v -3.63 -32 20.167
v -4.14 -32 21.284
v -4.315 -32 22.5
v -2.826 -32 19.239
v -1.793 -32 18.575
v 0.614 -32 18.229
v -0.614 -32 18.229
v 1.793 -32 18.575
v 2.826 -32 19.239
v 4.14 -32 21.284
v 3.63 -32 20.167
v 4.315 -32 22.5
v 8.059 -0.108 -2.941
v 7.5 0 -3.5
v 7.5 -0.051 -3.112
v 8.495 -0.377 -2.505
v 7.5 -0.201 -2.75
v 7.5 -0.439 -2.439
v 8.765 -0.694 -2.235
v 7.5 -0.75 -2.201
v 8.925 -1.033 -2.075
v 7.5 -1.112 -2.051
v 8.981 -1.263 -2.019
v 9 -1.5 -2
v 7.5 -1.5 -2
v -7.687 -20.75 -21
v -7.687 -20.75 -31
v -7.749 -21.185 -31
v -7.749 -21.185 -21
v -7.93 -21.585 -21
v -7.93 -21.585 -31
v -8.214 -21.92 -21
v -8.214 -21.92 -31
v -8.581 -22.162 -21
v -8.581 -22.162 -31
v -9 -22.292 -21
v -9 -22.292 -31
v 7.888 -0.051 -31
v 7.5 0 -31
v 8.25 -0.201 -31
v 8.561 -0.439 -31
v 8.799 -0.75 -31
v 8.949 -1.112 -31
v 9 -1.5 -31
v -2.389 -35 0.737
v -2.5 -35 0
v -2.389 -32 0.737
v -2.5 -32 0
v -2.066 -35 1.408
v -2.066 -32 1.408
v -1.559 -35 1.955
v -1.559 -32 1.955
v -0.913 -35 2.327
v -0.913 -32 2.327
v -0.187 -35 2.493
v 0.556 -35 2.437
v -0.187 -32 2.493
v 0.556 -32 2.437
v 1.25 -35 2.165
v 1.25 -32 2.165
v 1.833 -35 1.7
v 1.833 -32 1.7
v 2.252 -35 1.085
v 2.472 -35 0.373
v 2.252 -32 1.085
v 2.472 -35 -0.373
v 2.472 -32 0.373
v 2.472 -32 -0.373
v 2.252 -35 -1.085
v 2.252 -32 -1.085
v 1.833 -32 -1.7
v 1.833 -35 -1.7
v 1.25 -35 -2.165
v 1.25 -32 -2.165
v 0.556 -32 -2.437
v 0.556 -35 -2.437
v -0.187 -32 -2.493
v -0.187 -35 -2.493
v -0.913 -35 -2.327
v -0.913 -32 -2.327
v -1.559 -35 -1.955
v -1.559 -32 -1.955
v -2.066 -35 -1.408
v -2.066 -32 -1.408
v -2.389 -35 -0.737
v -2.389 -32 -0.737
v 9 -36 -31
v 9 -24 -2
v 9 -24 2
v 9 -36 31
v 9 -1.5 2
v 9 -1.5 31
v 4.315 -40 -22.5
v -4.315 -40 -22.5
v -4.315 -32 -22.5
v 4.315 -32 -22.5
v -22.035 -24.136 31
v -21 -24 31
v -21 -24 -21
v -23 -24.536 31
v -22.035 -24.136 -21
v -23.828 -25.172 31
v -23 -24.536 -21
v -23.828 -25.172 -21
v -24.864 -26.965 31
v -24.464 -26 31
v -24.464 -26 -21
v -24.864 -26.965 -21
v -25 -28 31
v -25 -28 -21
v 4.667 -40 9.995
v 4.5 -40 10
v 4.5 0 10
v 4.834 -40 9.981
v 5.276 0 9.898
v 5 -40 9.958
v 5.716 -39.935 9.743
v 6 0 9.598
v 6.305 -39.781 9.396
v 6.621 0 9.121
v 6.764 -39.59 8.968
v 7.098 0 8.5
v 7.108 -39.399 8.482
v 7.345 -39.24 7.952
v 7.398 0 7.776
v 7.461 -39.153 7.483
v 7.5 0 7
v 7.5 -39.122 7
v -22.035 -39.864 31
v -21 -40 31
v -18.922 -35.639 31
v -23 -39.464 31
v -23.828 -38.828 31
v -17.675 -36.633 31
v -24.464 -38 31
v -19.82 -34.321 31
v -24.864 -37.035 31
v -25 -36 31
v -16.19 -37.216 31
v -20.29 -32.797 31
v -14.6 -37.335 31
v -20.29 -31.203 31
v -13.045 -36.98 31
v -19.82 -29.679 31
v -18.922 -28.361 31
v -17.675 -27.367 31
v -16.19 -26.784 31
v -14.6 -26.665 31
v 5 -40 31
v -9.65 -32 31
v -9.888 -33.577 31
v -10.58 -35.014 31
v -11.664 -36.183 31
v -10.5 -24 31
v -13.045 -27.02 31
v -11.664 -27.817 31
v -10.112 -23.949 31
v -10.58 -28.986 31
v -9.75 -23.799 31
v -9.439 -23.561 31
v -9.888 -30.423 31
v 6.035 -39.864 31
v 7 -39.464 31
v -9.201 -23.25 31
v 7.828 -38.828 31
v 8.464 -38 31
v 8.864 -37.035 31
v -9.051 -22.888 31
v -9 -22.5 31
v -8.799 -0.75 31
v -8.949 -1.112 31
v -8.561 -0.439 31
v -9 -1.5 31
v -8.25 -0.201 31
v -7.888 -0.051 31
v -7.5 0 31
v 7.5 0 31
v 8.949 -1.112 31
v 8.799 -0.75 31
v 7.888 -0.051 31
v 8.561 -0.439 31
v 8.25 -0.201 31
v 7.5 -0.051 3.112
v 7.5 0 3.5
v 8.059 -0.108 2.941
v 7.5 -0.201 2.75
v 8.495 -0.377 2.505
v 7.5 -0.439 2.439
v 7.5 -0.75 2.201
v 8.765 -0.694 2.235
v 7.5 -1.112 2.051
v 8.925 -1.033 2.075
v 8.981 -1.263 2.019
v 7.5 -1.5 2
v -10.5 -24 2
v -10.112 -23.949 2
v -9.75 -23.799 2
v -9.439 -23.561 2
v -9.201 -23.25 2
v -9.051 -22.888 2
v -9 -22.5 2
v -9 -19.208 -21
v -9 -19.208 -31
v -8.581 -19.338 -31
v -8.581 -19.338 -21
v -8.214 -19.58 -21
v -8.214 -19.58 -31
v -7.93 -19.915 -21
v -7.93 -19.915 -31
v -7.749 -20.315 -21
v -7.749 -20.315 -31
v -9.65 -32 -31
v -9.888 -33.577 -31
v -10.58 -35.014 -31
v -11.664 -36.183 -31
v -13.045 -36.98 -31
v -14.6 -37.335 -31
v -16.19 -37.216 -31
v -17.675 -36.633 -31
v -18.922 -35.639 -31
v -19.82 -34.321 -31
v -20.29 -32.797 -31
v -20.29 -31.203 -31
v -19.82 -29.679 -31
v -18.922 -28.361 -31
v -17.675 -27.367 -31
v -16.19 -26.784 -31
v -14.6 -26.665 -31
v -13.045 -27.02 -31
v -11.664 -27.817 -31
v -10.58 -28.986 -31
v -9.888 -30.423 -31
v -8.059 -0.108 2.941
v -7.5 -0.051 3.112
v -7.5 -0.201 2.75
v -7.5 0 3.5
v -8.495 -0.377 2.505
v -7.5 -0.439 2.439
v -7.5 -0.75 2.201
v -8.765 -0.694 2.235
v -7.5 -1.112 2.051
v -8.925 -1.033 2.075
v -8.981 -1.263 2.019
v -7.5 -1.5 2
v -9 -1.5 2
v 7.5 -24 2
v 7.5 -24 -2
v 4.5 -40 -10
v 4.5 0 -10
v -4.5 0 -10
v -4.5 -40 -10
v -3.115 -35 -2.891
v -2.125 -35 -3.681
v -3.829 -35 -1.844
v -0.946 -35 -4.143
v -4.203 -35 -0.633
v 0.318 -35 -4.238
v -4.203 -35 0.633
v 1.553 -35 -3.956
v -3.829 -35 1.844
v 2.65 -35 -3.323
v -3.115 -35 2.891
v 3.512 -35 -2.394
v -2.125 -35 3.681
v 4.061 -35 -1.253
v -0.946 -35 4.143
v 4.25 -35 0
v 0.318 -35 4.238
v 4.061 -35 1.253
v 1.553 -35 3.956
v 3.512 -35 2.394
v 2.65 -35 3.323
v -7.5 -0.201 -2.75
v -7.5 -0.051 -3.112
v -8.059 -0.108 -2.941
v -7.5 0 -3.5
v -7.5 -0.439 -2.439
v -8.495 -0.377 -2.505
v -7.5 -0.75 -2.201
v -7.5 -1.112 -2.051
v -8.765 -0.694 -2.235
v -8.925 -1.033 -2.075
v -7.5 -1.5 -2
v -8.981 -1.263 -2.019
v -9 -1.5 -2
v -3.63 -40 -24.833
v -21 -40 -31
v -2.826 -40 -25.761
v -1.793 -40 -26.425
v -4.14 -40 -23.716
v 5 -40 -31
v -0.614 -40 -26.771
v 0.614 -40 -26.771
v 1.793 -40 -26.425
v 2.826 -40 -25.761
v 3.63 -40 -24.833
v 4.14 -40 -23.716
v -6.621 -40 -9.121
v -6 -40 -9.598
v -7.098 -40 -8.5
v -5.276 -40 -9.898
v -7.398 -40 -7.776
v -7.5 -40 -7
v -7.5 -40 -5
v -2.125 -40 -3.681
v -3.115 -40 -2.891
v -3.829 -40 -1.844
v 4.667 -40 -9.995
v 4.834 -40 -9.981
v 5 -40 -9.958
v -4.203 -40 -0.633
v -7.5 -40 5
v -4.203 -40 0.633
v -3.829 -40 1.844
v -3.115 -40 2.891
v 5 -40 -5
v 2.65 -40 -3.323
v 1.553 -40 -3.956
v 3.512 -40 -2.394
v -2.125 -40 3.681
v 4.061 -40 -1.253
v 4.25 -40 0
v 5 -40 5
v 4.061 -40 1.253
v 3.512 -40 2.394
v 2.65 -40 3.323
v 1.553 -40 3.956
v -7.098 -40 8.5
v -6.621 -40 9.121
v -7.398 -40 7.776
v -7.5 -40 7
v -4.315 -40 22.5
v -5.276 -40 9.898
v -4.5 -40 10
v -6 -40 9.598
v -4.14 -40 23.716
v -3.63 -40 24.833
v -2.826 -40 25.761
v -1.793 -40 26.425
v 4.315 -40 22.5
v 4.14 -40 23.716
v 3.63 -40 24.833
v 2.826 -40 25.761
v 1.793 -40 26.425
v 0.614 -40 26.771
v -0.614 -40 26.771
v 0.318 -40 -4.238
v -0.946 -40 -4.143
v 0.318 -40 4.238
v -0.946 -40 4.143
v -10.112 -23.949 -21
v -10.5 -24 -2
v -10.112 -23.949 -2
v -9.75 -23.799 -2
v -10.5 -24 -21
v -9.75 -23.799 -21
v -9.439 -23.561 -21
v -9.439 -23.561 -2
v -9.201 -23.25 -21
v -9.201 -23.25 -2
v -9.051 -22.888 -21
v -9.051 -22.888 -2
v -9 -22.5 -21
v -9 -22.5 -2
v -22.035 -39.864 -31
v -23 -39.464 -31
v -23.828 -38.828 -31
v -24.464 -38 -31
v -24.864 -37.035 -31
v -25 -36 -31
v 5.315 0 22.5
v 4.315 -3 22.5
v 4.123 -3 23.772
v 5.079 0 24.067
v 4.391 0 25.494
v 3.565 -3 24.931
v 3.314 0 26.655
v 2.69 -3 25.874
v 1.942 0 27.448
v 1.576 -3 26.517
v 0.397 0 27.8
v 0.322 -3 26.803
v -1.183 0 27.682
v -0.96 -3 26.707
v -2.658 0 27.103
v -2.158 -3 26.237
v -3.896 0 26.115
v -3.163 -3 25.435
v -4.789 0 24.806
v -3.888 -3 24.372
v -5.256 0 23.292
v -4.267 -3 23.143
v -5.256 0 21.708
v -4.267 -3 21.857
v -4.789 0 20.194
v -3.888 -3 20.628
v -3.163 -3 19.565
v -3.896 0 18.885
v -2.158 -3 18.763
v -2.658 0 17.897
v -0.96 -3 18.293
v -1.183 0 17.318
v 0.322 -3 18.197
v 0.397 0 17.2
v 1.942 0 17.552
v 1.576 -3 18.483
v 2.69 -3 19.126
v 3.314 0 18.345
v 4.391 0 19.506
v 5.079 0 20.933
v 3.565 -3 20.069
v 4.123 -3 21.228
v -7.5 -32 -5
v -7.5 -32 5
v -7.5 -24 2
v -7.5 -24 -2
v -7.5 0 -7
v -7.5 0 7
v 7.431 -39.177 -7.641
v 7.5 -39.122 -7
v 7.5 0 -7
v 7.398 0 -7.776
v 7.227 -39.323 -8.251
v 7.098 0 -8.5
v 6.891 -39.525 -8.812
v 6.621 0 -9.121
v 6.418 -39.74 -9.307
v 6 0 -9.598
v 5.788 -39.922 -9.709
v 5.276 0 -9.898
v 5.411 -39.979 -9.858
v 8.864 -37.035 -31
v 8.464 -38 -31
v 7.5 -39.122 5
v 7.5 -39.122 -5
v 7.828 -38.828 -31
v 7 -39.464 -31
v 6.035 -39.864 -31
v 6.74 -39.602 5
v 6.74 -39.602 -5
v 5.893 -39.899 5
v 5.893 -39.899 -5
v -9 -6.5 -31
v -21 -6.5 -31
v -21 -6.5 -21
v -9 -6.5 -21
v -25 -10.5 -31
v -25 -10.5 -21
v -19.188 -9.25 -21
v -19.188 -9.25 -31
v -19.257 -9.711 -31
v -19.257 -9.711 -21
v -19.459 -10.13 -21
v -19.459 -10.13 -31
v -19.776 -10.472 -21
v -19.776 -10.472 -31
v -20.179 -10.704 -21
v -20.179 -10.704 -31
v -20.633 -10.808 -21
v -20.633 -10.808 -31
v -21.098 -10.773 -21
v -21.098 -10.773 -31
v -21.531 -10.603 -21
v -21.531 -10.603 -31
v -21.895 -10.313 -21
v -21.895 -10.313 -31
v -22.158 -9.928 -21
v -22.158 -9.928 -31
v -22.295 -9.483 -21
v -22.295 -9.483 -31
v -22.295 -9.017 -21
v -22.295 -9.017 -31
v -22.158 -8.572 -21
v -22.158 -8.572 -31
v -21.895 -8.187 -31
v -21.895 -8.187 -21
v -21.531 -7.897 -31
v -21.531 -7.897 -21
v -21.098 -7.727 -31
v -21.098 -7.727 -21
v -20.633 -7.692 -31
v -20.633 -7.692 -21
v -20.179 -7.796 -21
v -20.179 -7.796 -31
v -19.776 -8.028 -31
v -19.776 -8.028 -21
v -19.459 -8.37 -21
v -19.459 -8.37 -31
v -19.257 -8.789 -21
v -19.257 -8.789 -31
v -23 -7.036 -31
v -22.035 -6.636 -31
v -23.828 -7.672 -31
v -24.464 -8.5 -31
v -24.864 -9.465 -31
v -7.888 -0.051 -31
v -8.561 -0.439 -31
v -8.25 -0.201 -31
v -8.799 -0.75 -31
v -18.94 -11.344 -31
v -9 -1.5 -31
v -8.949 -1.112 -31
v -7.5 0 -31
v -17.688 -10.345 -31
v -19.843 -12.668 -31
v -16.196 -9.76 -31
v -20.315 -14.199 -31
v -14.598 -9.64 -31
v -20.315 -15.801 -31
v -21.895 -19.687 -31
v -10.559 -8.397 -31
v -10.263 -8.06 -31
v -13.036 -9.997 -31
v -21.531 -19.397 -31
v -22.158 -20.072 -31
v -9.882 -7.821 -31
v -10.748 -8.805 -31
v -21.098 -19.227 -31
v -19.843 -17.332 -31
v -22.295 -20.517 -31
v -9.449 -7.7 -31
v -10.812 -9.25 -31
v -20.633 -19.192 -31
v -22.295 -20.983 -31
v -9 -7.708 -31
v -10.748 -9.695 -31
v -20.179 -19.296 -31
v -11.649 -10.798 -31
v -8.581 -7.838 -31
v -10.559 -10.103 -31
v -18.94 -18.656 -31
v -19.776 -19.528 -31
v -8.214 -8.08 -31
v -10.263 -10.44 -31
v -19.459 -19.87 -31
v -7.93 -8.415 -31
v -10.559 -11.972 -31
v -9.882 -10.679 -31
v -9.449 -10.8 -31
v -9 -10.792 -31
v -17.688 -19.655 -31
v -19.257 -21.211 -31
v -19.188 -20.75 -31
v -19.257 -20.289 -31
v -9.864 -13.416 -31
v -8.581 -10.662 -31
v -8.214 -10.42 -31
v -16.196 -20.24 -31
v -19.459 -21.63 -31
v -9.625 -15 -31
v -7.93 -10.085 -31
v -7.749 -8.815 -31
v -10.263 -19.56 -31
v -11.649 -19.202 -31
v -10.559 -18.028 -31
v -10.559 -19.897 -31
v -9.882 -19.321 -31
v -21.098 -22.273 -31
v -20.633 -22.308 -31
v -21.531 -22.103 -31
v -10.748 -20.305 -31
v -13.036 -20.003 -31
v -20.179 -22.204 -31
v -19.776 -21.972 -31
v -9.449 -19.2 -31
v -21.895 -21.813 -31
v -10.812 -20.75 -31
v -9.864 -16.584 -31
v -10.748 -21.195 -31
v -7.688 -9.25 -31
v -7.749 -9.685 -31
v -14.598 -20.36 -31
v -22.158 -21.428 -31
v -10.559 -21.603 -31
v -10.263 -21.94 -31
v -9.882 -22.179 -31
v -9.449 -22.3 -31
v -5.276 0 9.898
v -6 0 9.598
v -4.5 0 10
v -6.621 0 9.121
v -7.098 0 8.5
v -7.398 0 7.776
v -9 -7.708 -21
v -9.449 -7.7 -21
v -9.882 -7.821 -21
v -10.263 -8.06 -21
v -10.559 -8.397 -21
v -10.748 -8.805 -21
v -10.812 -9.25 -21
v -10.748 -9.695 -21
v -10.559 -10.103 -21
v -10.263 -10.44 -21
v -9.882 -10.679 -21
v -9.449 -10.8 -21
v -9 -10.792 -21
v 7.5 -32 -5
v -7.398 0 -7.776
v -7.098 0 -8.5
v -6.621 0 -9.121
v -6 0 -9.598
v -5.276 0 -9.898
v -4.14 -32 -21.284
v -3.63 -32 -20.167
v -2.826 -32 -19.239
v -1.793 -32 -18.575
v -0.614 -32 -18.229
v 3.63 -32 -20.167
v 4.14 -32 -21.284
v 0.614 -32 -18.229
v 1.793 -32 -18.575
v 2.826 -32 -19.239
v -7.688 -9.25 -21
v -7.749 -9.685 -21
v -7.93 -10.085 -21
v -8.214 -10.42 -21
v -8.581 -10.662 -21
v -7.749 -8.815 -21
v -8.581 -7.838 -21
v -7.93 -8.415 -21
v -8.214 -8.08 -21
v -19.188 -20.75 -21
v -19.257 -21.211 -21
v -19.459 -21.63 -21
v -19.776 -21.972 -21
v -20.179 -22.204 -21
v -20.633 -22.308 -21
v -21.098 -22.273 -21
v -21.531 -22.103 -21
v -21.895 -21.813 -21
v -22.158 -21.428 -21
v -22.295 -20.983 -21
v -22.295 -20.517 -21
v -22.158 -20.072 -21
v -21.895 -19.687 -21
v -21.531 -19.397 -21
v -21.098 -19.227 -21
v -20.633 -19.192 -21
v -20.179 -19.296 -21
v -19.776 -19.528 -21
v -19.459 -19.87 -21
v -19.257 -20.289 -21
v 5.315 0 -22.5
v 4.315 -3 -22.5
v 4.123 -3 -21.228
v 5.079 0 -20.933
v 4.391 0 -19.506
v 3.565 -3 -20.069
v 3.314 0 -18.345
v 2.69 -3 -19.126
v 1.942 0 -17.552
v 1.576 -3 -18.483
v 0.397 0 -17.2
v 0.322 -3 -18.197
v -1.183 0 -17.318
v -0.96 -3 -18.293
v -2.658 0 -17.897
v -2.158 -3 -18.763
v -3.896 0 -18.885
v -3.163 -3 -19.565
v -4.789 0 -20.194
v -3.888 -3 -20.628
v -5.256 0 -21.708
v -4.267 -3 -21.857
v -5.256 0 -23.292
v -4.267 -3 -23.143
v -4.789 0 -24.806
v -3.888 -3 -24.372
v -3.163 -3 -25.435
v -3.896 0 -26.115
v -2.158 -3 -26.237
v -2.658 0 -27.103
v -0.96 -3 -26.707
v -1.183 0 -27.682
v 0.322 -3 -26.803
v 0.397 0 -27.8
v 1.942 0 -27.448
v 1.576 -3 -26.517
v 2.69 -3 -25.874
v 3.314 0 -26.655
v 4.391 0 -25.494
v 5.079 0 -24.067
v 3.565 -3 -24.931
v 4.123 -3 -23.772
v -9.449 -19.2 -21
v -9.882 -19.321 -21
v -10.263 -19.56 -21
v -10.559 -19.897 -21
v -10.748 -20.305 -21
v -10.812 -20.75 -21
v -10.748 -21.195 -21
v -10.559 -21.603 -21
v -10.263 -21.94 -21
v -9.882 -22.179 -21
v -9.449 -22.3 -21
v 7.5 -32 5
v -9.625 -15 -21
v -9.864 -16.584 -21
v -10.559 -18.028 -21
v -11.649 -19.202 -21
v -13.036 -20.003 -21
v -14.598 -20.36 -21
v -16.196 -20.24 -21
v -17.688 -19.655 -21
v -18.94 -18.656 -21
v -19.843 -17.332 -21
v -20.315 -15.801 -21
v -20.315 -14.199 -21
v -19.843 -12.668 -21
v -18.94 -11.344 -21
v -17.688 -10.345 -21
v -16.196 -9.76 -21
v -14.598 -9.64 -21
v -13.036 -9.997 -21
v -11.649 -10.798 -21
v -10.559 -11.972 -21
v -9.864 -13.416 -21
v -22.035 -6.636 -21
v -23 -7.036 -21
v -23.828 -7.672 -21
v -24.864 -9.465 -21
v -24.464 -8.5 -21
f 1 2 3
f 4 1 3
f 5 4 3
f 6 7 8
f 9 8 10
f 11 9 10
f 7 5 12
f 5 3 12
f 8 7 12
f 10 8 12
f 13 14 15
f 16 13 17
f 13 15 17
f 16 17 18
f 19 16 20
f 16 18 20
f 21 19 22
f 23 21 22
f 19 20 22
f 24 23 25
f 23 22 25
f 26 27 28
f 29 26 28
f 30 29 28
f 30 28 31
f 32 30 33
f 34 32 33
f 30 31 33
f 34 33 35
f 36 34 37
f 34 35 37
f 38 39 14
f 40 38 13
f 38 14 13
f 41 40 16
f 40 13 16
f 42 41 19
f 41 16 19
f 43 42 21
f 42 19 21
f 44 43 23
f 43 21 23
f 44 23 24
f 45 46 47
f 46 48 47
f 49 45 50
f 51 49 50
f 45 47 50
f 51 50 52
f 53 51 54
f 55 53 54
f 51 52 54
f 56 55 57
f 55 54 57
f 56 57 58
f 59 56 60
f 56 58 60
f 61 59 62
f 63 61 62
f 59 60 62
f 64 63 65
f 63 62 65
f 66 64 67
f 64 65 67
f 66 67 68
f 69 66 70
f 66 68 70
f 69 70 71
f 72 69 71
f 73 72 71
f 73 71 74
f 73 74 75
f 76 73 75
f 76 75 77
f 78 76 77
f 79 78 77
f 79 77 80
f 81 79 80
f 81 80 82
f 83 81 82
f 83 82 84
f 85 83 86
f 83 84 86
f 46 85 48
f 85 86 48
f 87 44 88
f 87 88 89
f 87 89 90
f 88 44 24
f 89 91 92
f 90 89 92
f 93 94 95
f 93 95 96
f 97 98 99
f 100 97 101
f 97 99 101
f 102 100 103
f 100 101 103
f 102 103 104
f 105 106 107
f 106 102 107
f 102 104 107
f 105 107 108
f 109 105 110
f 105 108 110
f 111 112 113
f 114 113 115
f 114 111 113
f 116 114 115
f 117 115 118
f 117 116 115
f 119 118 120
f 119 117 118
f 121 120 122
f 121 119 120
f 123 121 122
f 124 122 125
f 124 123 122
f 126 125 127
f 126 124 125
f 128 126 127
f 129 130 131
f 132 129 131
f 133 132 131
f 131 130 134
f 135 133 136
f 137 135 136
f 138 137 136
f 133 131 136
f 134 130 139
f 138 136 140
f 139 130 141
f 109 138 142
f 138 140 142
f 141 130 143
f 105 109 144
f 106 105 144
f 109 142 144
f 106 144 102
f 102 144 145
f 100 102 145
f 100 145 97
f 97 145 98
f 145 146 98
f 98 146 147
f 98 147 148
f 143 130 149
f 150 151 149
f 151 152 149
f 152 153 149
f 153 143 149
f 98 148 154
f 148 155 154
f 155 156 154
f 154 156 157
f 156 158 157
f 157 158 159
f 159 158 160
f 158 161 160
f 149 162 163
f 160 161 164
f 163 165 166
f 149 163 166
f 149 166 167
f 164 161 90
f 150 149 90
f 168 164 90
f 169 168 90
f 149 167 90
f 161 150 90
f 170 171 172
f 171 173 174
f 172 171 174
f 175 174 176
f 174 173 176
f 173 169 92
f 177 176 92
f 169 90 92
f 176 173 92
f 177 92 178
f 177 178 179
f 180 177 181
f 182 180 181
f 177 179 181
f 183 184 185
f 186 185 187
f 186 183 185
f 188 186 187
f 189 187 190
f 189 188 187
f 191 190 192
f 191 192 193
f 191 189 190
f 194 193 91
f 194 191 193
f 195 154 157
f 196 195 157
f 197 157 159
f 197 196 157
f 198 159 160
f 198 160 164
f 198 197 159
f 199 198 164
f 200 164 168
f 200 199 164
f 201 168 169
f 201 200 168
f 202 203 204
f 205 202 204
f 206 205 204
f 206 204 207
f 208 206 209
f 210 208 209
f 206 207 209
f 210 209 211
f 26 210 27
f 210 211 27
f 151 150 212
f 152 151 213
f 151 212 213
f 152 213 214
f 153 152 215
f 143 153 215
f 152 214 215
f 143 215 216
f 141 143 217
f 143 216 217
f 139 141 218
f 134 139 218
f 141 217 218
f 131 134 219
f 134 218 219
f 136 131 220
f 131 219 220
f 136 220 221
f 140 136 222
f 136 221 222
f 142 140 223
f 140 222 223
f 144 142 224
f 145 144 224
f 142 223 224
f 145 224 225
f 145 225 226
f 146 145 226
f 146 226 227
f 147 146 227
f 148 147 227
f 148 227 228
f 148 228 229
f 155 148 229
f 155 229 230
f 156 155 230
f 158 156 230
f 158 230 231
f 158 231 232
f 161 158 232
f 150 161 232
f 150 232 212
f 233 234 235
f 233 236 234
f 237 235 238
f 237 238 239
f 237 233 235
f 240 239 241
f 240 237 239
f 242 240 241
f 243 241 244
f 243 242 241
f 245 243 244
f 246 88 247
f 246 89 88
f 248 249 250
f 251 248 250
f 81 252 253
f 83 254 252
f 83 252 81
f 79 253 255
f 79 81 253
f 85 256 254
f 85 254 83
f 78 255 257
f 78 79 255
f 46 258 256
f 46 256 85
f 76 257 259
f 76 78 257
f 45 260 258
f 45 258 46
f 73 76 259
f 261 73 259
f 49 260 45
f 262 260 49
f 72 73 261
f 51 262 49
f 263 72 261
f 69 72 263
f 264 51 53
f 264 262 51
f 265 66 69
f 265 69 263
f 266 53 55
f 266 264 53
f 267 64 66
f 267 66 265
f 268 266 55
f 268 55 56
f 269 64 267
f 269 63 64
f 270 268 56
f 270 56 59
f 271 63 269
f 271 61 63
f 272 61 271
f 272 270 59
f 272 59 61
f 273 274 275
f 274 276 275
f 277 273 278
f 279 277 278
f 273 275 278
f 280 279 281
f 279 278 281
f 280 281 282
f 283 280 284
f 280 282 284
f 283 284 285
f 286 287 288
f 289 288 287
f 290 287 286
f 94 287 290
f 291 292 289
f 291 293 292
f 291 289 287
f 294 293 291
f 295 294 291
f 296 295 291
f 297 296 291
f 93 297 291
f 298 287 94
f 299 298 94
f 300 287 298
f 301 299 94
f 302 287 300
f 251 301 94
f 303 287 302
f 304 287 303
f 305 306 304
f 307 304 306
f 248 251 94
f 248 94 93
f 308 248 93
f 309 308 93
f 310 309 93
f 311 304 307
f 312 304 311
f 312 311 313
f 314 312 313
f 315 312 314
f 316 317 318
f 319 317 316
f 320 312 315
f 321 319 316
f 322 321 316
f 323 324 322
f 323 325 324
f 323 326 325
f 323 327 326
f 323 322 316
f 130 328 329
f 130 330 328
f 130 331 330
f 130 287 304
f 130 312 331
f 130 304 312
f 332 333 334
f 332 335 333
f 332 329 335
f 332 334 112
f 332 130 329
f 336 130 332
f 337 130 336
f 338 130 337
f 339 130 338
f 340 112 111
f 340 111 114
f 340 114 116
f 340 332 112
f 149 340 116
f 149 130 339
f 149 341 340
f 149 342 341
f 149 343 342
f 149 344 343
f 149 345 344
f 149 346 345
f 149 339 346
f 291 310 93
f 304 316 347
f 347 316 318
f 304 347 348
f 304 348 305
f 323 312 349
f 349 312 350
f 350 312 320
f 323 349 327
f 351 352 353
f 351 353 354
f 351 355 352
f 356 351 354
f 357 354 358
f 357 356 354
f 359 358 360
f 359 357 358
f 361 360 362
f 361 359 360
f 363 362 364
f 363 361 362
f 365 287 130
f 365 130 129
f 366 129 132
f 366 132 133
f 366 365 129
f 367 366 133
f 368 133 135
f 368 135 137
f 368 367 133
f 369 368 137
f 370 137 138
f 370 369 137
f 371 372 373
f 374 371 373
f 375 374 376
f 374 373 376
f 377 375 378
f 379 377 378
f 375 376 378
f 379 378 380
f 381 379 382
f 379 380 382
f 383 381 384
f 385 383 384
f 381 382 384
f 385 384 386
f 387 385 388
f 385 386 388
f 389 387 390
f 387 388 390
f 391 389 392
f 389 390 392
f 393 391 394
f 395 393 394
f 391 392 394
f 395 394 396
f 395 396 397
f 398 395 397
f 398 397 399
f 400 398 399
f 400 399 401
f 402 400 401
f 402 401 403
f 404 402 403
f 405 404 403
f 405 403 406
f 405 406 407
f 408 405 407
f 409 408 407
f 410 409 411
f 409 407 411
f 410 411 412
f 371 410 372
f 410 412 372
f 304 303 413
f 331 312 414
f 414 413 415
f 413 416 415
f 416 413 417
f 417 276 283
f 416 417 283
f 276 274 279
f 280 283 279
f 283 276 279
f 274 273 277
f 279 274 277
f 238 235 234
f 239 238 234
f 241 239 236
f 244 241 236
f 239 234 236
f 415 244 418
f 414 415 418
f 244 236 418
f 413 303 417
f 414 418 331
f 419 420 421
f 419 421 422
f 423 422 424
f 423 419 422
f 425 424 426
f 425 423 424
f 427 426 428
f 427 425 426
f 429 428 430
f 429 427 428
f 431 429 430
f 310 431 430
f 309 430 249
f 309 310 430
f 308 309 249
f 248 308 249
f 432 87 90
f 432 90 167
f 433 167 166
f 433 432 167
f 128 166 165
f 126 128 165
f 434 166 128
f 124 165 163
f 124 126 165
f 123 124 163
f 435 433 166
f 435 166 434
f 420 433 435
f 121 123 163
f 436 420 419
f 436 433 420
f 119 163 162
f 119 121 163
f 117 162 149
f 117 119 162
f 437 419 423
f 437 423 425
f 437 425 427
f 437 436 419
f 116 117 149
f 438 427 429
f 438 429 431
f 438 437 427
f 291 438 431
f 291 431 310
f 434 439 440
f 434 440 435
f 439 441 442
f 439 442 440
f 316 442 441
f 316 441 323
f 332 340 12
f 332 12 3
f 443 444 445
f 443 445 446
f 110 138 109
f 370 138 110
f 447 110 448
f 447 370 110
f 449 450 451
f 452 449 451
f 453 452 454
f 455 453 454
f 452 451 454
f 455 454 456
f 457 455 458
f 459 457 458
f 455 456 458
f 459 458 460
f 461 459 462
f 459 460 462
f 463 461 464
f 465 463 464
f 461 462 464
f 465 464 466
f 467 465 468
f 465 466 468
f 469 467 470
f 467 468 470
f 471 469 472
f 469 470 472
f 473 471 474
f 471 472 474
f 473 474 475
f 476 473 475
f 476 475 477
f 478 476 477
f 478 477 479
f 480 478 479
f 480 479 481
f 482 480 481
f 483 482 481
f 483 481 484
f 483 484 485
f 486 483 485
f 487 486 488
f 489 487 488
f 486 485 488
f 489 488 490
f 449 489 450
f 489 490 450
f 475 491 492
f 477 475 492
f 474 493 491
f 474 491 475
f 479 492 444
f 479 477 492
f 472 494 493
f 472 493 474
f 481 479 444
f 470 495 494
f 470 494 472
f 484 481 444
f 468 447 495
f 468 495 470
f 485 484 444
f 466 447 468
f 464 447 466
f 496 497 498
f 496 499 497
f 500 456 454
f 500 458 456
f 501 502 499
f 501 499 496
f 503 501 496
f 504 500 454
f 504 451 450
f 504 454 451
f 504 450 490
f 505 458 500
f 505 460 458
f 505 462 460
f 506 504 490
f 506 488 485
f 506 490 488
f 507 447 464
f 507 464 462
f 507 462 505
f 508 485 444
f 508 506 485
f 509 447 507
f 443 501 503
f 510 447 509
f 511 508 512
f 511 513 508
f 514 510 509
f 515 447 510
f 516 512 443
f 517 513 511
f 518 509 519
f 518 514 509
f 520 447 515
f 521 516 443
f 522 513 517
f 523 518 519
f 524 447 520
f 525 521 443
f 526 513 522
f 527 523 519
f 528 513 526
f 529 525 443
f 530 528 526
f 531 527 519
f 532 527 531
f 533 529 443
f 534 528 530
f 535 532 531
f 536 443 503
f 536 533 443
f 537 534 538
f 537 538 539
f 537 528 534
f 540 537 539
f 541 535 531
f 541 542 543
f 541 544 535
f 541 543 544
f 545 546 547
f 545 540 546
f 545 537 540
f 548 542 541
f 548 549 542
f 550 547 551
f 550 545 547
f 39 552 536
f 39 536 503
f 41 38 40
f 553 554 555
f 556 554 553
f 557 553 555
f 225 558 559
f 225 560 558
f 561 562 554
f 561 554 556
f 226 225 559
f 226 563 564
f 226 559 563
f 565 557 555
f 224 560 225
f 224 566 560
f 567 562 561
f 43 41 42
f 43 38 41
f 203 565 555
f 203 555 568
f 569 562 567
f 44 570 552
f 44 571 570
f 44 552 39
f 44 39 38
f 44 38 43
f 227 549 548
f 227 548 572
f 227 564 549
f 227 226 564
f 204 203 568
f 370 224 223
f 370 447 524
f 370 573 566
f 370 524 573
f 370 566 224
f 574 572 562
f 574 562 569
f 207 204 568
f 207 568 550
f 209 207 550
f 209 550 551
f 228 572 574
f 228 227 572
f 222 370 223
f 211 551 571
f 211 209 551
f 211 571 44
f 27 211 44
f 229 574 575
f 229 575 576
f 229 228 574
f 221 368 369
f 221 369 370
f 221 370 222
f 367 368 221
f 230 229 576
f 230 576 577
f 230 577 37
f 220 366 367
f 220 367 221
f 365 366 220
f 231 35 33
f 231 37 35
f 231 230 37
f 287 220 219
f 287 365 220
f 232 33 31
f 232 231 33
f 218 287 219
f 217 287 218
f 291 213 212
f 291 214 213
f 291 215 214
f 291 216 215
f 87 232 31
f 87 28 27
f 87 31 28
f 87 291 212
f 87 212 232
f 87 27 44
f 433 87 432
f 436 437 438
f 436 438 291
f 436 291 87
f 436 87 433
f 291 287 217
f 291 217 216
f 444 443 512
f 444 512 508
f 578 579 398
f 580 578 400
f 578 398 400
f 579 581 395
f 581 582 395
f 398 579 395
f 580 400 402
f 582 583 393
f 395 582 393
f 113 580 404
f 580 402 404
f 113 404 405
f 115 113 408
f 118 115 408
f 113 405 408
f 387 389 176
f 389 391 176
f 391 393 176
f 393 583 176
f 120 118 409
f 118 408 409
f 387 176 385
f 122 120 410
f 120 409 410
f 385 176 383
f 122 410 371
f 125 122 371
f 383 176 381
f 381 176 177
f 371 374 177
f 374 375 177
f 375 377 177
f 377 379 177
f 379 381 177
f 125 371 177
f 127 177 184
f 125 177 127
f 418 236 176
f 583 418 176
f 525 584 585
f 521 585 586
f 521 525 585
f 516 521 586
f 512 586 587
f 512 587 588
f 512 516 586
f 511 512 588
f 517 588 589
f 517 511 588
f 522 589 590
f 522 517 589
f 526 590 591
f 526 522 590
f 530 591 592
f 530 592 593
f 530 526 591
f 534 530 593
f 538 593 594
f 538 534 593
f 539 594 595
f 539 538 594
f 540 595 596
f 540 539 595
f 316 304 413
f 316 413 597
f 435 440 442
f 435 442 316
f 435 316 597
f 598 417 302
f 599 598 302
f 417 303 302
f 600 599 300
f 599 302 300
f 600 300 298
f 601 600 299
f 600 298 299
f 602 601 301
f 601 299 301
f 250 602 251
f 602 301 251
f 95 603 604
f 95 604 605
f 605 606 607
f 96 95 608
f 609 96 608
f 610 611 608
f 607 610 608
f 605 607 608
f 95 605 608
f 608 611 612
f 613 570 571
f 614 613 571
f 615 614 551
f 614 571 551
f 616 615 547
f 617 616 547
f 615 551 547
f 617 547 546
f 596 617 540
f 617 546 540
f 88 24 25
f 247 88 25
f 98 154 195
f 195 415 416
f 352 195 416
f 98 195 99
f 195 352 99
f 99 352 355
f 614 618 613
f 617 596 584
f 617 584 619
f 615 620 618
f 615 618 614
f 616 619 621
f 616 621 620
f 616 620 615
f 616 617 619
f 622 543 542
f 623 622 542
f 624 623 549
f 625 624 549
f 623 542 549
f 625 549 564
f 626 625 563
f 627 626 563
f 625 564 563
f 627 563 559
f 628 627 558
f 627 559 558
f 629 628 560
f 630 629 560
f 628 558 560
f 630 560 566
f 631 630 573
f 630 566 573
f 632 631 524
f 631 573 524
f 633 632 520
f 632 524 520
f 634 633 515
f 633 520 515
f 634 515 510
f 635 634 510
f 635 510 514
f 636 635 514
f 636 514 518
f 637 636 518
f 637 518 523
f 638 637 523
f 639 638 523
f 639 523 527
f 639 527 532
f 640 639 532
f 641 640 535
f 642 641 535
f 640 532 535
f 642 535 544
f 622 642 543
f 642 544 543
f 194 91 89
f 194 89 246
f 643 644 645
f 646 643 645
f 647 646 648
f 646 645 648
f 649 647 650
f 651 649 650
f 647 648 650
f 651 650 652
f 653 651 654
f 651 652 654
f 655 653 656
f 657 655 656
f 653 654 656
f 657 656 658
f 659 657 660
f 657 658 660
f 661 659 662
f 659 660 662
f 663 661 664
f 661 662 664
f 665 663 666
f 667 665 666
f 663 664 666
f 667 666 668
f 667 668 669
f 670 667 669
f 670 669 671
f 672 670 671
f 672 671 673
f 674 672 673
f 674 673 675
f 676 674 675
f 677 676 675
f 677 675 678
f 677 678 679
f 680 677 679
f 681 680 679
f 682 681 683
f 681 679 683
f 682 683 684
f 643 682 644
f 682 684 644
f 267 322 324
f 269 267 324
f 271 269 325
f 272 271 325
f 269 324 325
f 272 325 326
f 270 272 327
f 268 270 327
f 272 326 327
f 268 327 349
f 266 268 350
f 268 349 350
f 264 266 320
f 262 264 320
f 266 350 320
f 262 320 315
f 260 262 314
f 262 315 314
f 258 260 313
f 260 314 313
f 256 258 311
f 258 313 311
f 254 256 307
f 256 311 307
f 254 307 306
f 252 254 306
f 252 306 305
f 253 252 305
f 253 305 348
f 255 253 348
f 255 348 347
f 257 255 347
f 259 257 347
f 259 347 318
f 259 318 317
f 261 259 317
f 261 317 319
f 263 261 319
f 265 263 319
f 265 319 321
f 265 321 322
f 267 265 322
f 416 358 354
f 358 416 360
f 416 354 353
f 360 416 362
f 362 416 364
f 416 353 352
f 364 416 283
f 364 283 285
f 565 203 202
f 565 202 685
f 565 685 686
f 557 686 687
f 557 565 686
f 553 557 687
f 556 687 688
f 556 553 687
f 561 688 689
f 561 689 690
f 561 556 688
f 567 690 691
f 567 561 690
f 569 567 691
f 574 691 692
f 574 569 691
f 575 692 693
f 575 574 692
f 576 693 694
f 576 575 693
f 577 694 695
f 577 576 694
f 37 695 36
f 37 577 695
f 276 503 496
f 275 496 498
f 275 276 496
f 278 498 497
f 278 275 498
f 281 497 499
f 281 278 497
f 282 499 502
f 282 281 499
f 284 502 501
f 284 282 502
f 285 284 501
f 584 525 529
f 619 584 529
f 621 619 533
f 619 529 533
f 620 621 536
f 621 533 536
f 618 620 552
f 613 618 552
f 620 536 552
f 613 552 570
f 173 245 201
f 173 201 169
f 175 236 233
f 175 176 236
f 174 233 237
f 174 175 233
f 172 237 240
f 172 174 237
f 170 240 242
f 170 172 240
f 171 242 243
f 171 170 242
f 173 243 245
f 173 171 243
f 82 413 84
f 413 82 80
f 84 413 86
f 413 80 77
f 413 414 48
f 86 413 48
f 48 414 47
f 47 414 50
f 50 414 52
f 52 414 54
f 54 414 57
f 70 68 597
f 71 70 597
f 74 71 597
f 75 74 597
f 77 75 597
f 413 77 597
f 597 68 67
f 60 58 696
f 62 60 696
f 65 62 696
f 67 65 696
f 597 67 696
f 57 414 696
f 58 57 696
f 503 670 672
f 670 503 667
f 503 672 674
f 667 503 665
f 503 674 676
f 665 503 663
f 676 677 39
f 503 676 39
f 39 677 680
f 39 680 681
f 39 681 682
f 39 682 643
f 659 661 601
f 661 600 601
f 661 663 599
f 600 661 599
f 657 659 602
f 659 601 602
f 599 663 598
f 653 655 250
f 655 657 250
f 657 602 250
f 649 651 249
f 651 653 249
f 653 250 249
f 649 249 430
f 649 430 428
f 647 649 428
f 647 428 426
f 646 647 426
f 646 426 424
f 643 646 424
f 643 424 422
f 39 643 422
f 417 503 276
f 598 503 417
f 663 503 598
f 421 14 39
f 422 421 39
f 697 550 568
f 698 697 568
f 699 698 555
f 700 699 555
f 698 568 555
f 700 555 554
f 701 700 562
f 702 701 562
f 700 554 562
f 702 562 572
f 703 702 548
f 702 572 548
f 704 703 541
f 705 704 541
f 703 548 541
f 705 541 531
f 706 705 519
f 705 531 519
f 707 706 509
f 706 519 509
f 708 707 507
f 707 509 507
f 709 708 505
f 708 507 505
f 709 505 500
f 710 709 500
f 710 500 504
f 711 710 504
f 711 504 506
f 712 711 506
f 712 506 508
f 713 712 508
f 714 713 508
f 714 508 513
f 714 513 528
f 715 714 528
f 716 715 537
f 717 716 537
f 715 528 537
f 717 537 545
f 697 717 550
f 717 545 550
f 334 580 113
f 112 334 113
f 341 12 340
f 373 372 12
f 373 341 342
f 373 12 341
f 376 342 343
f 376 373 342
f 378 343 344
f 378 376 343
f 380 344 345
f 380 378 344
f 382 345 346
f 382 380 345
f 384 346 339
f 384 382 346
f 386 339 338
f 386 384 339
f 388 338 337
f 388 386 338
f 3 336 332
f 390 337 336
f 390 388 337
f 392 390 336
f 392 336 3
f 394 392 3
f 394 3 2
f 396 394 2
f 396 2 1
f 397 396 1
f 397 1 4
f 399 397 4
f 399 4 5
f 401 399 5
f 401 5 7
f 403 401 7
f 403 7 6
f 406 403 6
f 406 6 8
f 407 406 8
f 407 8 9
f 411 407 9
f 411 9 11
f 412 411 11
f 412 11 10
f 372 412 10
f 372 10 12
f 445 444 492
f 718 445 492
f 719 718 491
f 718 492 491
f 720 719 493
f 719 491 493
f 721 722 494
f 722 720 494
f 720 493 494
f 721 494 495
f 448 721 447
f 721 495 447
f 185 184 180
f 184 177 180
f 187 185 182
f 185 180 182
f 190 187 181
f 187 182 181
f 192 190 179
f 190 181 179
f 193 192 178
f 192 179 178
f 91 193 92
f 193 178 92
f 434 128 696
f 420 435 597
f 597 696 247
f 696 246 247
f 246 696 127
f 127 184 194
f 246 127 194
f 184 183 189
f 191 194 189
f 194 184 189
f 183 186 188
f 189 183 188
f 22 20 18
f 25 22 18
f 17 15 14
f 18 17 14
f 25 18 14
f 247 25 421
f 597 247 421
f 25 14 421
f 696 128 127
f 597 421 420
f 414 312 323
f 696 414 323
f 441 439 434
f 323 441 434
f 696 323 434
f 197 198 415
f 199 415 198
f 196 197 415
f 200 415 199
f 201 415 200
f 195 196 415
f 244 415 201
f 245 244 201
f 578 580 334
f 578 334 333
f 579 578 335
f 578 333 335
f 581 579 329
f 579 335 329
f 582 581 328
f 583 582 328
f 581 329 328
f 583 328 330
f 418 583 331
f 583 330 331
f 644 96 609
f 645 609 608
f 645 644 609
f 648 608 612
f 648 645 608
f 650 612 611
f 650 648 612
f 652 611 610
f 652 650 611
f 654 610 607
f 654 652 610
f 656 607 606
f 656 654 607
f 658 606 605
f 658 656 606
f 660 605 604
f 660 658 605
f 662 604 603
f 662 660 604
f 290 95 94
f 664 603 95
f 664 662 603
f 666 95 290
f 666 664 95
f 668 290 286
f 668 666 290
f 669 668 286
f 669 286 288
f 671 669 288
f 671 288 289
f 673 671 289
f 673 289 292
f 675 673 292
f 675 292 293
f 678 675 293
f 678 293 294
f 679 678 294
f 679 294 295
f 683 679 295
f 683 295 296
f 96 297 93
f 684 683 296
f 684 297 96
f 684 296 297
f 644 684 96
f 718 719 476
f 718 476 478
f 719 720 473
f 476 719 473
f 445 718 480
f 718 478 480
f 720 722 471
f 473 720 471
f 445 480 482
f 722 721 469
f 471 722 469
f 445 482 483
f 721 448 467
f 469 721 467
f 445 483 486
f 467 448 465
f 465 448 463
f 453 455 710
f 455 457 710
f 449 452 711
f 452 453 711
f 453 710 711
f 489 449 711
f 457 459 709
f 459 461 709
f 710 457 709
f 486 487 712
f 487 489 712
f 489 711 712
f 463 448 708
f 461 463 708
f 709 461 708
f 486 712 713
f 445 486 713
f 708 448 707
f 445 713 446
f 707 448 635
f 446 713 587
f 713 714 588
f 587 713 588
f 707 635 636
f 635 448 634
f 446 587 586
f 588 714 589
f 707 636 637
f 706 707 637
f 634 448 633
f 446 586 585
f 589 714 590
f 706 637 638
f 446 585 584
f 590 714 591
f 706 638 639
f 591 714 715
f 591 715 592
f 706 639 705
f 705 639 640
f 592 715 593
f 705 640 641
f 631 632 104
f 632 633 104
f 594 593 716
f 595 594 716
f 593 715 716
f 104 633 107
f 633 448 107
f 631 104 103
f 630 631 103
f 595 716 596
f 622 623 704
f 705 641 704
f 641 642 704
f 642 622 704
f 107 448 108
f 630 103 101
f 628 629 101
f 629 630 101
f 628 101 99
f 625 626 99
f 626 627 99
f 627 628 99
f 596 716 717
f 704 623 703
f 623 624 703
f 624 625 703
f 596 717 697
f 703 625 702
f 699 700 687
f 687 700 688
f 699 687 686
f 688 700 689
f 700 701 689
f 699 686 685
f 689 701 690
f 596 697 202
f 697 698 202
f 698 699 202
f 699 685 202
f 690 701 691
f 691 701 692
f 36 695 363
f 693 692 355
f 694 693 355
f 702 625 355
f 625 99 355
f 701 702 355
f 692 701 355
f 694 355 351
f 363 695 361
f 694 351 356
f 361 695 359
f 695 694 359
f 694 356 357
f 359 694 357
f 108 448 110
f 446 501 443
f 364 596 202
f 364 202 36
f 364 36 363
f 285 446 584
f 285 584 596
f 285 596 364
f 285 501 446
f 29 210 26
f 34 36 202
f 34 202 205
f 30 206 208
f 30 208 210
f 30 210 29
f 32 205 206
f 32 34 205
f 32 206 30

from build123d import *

# Parameters (mm, degrees)
F0_W            = 18
F0_H            = 62
F0_R            = 4.315
F1_DEPTH        = 40
F3_DEPTH        = 16
F4_R            = 5.35
F5_DEPTH        = 100
F6_R            = 1.5625
F6_R_2          = 5.375
F7_DEPTH        = 10
F8_DEPTH        = 10
F10_DEPTH       = 100
F9_W            = 1.5
F9_H            = 2
F11_DEPTH       = 24
F12_W           = 15
F12_H           = 10
F13_DEPTH       = 8
F14_SIZE2       = 3
F14_SIZE        = 1
F14_2_SIZE2     = 3
F14_2_SIZE      = 1
F15_R           = 3
F16_T1_DEPTH    = 62
F16_T3_DEPTH    = 82
F16_T5_DEPTH    = 30
F17_R           = 1.49999
F18_D           = 5
F18_DEPTH       = 10
F18_CBORE_D     = 8.5
F18_CBORE_DEPTH = 5
F18_TIP         = 1.5021515476


# Not quite as in the source:
# - a fillet or chamfer that OpenCascade refuses, or shapes differently, is made with other operations: its cross-section is extruded or revolved along the edge and cut away or added
# - a fillet or chamfer is up to 0.001 mm smaller than in the source, because OpenCascade refuses the exact size


with BuildPart() as f1:
    # F0 (on Front) → F1 (new body)
    with BuildSketch(Plane.XZ):
        Rectangle(F0_W, F0_H)
        with Locations((0, -22.5)):
            Circle(F0_R, mode=Mode.SUBTRACT)
        with Locations((0, 22.5)):
            Circle(F0_R, mode=Mode.SUBTRACT)
    extrude(amount=F1_DEPTH)

    # F2 (on face) → F3 (join)
    with BuildSketch(Plane(origin=(-9, 0, 0), x_dir=(0, -1, 0), z_dir=(-1, 0, 0))):
        Polygon((24, 31), (24, 0), (24, -31), (40, -31), (40, 31), align=None)
    extrude(amount=F3_DEPTH)

    # F4 (on face) → F5 (cut)
    with BuildSketch(Plane(origin=(0, 0, -31), x_dir=(1, 0, 0), z_dir=(0, 0, -1))):
        with Locations((-15, 32)):
            Circle(F4_R)
    extrude(amount=-F5_DEPTH, mode=Mode.SUBTRACT)

    # F6 (on face) → F7 (join)
    with BuildSketch(Plane(origin=(0, 0, -31), x_dir=(1, 0, 0), z_dir=(0, 0, -1))):
        with BuildLine():
            Line((-9, 22.2923703349), (-9, 24))
            Line((-9, 24), (-25, 24))
            Line((-25, 24), (-25, 6.5))
            Line((-25, 6.5), (-9, 6.5))
            Line((-9, 6.5), (-9, 7.7076296651))
            ThreePointArc((-9, 7.7076296651), (-10.8125, 9.25), (-9, 10.7923703349))
            Line((-9, 10.7923703349), (-9, 19.2076296651))
            ThreePointArc((-9, 19.2076296651), (-10.8125, 20.75), (-9, 22.2923703349))
        make_face()
        with Locations((-20.75, 9.25)):
            Circle(F6_R, mode=Mode.SUBTRACT)
        with Locations((-15, 15)):
            Circle(F6_R_2, mode=Mode.SUBTRACT)
        with Locations((-20.75, 20.75)):
            Circle(F6_R, mode=Mode.SUBTRACT)
    extrude(amount=-F7_DEPTH)

    # F6 (on face) → F8 (cut)
    with BuildSketch(Plane(origin=(0, 0, -31), x_dir=(1, 0, 0), z_dir=(0, 0, -1))):
        with BuildLine():
            ThreePointArc((-7.6875, 20.75), (-8.0600354522, 21.7626157341), (-9, 22.2923703349))
            Line((-9, 22.2923703349), (-9, 19.2076296651))
            ThreePointArc((-9, 19.2076296651), (-8.0600354522, 19.7373842659), (-7.6875, 20.75))
        make_face()
        with BuildLine():
            ThreePointArc((-7.6875, 9.25), (-8.0600354522, 10.2626157341), (-9, 10.7923703349))
            Line((-9, 10.7923703349), (-9, 7.7076296651))
            ThreePointArc((-9, 7.7076296651), (-8.0600354522, 8.2373842659), (-7.6875, 9.25))
        make_face()
    extrude(amount=-F8_DEPTH, mode=Mode.SUBTRACT)

    # F9 (on face) → F10 (cut)
    with BuildSketch(Plane(origin=(0, 0, 0), x_dir=(-1, 0, 0), z_dir=(0, 1, 0))):
        Polygon((7.5, 2), (7.5, 10), (-7.5, 10), (-7.5, 2), (-7.5, 0), (0, 0), (7.5, 0), align=None)
        Polygon((7.5, -2), (7.5, 0), (0, 0), (-7.5, 0), (-7.5, -2), (-7.5, -10), (7.5, -10), align=None)
    extrude(amount=-F10_DEPTH, mode=Mode.SUBTRACT)

    # F9 (on face) → F11 (cut)
    with BuildSketch(Plane(origin=(0, 0, 0), x_dir=(-1, 0, 0), z_dir=(0, 1, 0))):
        with Locations((-8.25, -1)):
            Rectangle(F9_W, F9_H)
        with Locations((-8.25, 1)):
            Rectangle(F9_W, F9_H)
        with Locations((8.25, -1)):
            Rectangle(F9_W, F9_H)
        with Locations((8.25, 1)):
            Rectangle(F9_W, F9_H)
    extrude(amount=-F11_DEPTH, mode=Mode.SUBTRACT)

    # F12 (on face) → F13 (join)
    with BuildSketch(Plane.XZ.offset(40)):
        Rectangle(F12_W, F12_H)
        with BuildLine():
            Line((4.315, 22.5), (0, 22.5))
            Line((0, 22.5), (-4.315, 22.5))
            ThreePointArc((-4.315, 22.5), (0, 18.185), (4.315, 22.5))
        make_face()
        with BuildLine():
            Line((-4.315, -22.5), (0, -22.5))
            Line((0, -22.5), (4.315, -22.5))
            ThreePointArc((4.315, -22.5), (0, -18.185), (-4.315, -22.5))
        make_face()
    extrude(amount=-F13_DEPTH)

    # F14
    f14_edges = [f1.edges().sort_by_distance(p)[0] for p in [
        (-4.315, 0, 22.5),
    ]]
    f14_side = f1.faces().sort_by_distance((8.25, 0, 2.341321))[0]
    chamfer(f14_edges, length=F14_SIZE, length2=F14_SIZE2, reference=f14_side)

    # F14#2
    f14_2_edges = [f1.edges().sort_by_distance(p)[0] for p in [
        (-4.315, 0, -22.5),
    ]]
    f14_2_side = f1.faces().sort_by_distance((0, 0, -30.658679))[0]
    chamfer(f14_2_edges, length=F14_2_SIZE, length2=F14_2_SIZE2, reference=f14_2_side)

    # F15
    f15_edges = [f1.edges().sort_by_distance(p)[0] for p in [
        (-7.5, -20, 10),
        (7.5, -20, 10),
        (7.5, -20, -10),
        (-7.5, -20, -10),
    ]]
    fillet(f15_edges, radius=F15_R)

    # F16: fillet of radius 4 on 4 edges, made by hand

    # F16_s2 → F16_t1 (cut)
    with BuildSketch(Plane.XY.offset(-21)):
        with BuildLine():
            ThreePointArc((-21, -24), (-23.8284271247, -25.1715728753), (-25, -28))
            Line((-25, -28), (-25, -24))
            Line((-25, -24), (-21, -24))
        make_face()
    extrude(amount=F16_T1_DEPTH, mode=Mode.SUBTRACT)

    # F16_s4 → F16_t3 (cut)
    with BuildSketch(Plane.XY.offset(-41)):
        with BuildLine():
            ThreePointArc((-21, -40), (-23.8284271247, -38.8284271247), (-25, -36))
            Line((-25, -36), (-25, -40))
            Line((-25, -40), (-21, -40))
        make_face()
        with BuildLine():
            ThreePointArc((9, -36), (7.8284271247, -38.8284271247), (5, -40))
            Line((5, -40), (9, -40))
            Line((9, -40), (9, -36))
        make_face()
    extrude(amount=F16_T3_DEPTH, mode=Mode.SUBTRACT)

    # F16_s6 → F16_t5 (cut)
    with BuildSketch(Plane.XY.offset(-41)):
        with BuildLine():
            ThreePointArc((-21, -6.5), (-23.8284271247, -7.6715728753), (-25, -10.5))
            Line((-25, -10.5), (-25, -6.5))
            Line((-25, -6.5), (-21, -6.5))
        make_face()
    extrude(amount=F16_T5_DEPTH, mode=Mode.SUBTRACT)

    # F17 (radius 1.5 in the source; OpenCascade refuses exactly that, so slightly less here)
    f17_edges = [f1.edges().sort_by_distance(p)[0] for p in [
        (-25, -10.5, -26),
        (-9, 0, -16.5),
        (9, 0, -16.5),
        (-9, -24, -11.5),
        (-9, -24, 16.5),
        (9, 0, 16.5),
        (-9, 0, 16.5),
        (-8.25, 0, 2),
        (-8.25, 0, -2),
        (8.25, 0, -2),
        (8.25, 0, 2),
    ]]
    fillet(f17_edges, radius=F17_R)

    # F18
    with Locations(Plane.XZ.offset(40)):
        with Locations((0, 0)):
            CounterBoreHole(F18_D / 2, F18_CBORE_D / 2, F18_CBORE_DEPTH, depth=F18_DEPTH)
            with Locations((0, 0, -(F18_DEPTH + F18_TIP / 2))):  # 118° drill point
                Cone(0, F18_D / 2, F18_TIP, mode=Mode.SUBTRACT)


solid = f1.part
